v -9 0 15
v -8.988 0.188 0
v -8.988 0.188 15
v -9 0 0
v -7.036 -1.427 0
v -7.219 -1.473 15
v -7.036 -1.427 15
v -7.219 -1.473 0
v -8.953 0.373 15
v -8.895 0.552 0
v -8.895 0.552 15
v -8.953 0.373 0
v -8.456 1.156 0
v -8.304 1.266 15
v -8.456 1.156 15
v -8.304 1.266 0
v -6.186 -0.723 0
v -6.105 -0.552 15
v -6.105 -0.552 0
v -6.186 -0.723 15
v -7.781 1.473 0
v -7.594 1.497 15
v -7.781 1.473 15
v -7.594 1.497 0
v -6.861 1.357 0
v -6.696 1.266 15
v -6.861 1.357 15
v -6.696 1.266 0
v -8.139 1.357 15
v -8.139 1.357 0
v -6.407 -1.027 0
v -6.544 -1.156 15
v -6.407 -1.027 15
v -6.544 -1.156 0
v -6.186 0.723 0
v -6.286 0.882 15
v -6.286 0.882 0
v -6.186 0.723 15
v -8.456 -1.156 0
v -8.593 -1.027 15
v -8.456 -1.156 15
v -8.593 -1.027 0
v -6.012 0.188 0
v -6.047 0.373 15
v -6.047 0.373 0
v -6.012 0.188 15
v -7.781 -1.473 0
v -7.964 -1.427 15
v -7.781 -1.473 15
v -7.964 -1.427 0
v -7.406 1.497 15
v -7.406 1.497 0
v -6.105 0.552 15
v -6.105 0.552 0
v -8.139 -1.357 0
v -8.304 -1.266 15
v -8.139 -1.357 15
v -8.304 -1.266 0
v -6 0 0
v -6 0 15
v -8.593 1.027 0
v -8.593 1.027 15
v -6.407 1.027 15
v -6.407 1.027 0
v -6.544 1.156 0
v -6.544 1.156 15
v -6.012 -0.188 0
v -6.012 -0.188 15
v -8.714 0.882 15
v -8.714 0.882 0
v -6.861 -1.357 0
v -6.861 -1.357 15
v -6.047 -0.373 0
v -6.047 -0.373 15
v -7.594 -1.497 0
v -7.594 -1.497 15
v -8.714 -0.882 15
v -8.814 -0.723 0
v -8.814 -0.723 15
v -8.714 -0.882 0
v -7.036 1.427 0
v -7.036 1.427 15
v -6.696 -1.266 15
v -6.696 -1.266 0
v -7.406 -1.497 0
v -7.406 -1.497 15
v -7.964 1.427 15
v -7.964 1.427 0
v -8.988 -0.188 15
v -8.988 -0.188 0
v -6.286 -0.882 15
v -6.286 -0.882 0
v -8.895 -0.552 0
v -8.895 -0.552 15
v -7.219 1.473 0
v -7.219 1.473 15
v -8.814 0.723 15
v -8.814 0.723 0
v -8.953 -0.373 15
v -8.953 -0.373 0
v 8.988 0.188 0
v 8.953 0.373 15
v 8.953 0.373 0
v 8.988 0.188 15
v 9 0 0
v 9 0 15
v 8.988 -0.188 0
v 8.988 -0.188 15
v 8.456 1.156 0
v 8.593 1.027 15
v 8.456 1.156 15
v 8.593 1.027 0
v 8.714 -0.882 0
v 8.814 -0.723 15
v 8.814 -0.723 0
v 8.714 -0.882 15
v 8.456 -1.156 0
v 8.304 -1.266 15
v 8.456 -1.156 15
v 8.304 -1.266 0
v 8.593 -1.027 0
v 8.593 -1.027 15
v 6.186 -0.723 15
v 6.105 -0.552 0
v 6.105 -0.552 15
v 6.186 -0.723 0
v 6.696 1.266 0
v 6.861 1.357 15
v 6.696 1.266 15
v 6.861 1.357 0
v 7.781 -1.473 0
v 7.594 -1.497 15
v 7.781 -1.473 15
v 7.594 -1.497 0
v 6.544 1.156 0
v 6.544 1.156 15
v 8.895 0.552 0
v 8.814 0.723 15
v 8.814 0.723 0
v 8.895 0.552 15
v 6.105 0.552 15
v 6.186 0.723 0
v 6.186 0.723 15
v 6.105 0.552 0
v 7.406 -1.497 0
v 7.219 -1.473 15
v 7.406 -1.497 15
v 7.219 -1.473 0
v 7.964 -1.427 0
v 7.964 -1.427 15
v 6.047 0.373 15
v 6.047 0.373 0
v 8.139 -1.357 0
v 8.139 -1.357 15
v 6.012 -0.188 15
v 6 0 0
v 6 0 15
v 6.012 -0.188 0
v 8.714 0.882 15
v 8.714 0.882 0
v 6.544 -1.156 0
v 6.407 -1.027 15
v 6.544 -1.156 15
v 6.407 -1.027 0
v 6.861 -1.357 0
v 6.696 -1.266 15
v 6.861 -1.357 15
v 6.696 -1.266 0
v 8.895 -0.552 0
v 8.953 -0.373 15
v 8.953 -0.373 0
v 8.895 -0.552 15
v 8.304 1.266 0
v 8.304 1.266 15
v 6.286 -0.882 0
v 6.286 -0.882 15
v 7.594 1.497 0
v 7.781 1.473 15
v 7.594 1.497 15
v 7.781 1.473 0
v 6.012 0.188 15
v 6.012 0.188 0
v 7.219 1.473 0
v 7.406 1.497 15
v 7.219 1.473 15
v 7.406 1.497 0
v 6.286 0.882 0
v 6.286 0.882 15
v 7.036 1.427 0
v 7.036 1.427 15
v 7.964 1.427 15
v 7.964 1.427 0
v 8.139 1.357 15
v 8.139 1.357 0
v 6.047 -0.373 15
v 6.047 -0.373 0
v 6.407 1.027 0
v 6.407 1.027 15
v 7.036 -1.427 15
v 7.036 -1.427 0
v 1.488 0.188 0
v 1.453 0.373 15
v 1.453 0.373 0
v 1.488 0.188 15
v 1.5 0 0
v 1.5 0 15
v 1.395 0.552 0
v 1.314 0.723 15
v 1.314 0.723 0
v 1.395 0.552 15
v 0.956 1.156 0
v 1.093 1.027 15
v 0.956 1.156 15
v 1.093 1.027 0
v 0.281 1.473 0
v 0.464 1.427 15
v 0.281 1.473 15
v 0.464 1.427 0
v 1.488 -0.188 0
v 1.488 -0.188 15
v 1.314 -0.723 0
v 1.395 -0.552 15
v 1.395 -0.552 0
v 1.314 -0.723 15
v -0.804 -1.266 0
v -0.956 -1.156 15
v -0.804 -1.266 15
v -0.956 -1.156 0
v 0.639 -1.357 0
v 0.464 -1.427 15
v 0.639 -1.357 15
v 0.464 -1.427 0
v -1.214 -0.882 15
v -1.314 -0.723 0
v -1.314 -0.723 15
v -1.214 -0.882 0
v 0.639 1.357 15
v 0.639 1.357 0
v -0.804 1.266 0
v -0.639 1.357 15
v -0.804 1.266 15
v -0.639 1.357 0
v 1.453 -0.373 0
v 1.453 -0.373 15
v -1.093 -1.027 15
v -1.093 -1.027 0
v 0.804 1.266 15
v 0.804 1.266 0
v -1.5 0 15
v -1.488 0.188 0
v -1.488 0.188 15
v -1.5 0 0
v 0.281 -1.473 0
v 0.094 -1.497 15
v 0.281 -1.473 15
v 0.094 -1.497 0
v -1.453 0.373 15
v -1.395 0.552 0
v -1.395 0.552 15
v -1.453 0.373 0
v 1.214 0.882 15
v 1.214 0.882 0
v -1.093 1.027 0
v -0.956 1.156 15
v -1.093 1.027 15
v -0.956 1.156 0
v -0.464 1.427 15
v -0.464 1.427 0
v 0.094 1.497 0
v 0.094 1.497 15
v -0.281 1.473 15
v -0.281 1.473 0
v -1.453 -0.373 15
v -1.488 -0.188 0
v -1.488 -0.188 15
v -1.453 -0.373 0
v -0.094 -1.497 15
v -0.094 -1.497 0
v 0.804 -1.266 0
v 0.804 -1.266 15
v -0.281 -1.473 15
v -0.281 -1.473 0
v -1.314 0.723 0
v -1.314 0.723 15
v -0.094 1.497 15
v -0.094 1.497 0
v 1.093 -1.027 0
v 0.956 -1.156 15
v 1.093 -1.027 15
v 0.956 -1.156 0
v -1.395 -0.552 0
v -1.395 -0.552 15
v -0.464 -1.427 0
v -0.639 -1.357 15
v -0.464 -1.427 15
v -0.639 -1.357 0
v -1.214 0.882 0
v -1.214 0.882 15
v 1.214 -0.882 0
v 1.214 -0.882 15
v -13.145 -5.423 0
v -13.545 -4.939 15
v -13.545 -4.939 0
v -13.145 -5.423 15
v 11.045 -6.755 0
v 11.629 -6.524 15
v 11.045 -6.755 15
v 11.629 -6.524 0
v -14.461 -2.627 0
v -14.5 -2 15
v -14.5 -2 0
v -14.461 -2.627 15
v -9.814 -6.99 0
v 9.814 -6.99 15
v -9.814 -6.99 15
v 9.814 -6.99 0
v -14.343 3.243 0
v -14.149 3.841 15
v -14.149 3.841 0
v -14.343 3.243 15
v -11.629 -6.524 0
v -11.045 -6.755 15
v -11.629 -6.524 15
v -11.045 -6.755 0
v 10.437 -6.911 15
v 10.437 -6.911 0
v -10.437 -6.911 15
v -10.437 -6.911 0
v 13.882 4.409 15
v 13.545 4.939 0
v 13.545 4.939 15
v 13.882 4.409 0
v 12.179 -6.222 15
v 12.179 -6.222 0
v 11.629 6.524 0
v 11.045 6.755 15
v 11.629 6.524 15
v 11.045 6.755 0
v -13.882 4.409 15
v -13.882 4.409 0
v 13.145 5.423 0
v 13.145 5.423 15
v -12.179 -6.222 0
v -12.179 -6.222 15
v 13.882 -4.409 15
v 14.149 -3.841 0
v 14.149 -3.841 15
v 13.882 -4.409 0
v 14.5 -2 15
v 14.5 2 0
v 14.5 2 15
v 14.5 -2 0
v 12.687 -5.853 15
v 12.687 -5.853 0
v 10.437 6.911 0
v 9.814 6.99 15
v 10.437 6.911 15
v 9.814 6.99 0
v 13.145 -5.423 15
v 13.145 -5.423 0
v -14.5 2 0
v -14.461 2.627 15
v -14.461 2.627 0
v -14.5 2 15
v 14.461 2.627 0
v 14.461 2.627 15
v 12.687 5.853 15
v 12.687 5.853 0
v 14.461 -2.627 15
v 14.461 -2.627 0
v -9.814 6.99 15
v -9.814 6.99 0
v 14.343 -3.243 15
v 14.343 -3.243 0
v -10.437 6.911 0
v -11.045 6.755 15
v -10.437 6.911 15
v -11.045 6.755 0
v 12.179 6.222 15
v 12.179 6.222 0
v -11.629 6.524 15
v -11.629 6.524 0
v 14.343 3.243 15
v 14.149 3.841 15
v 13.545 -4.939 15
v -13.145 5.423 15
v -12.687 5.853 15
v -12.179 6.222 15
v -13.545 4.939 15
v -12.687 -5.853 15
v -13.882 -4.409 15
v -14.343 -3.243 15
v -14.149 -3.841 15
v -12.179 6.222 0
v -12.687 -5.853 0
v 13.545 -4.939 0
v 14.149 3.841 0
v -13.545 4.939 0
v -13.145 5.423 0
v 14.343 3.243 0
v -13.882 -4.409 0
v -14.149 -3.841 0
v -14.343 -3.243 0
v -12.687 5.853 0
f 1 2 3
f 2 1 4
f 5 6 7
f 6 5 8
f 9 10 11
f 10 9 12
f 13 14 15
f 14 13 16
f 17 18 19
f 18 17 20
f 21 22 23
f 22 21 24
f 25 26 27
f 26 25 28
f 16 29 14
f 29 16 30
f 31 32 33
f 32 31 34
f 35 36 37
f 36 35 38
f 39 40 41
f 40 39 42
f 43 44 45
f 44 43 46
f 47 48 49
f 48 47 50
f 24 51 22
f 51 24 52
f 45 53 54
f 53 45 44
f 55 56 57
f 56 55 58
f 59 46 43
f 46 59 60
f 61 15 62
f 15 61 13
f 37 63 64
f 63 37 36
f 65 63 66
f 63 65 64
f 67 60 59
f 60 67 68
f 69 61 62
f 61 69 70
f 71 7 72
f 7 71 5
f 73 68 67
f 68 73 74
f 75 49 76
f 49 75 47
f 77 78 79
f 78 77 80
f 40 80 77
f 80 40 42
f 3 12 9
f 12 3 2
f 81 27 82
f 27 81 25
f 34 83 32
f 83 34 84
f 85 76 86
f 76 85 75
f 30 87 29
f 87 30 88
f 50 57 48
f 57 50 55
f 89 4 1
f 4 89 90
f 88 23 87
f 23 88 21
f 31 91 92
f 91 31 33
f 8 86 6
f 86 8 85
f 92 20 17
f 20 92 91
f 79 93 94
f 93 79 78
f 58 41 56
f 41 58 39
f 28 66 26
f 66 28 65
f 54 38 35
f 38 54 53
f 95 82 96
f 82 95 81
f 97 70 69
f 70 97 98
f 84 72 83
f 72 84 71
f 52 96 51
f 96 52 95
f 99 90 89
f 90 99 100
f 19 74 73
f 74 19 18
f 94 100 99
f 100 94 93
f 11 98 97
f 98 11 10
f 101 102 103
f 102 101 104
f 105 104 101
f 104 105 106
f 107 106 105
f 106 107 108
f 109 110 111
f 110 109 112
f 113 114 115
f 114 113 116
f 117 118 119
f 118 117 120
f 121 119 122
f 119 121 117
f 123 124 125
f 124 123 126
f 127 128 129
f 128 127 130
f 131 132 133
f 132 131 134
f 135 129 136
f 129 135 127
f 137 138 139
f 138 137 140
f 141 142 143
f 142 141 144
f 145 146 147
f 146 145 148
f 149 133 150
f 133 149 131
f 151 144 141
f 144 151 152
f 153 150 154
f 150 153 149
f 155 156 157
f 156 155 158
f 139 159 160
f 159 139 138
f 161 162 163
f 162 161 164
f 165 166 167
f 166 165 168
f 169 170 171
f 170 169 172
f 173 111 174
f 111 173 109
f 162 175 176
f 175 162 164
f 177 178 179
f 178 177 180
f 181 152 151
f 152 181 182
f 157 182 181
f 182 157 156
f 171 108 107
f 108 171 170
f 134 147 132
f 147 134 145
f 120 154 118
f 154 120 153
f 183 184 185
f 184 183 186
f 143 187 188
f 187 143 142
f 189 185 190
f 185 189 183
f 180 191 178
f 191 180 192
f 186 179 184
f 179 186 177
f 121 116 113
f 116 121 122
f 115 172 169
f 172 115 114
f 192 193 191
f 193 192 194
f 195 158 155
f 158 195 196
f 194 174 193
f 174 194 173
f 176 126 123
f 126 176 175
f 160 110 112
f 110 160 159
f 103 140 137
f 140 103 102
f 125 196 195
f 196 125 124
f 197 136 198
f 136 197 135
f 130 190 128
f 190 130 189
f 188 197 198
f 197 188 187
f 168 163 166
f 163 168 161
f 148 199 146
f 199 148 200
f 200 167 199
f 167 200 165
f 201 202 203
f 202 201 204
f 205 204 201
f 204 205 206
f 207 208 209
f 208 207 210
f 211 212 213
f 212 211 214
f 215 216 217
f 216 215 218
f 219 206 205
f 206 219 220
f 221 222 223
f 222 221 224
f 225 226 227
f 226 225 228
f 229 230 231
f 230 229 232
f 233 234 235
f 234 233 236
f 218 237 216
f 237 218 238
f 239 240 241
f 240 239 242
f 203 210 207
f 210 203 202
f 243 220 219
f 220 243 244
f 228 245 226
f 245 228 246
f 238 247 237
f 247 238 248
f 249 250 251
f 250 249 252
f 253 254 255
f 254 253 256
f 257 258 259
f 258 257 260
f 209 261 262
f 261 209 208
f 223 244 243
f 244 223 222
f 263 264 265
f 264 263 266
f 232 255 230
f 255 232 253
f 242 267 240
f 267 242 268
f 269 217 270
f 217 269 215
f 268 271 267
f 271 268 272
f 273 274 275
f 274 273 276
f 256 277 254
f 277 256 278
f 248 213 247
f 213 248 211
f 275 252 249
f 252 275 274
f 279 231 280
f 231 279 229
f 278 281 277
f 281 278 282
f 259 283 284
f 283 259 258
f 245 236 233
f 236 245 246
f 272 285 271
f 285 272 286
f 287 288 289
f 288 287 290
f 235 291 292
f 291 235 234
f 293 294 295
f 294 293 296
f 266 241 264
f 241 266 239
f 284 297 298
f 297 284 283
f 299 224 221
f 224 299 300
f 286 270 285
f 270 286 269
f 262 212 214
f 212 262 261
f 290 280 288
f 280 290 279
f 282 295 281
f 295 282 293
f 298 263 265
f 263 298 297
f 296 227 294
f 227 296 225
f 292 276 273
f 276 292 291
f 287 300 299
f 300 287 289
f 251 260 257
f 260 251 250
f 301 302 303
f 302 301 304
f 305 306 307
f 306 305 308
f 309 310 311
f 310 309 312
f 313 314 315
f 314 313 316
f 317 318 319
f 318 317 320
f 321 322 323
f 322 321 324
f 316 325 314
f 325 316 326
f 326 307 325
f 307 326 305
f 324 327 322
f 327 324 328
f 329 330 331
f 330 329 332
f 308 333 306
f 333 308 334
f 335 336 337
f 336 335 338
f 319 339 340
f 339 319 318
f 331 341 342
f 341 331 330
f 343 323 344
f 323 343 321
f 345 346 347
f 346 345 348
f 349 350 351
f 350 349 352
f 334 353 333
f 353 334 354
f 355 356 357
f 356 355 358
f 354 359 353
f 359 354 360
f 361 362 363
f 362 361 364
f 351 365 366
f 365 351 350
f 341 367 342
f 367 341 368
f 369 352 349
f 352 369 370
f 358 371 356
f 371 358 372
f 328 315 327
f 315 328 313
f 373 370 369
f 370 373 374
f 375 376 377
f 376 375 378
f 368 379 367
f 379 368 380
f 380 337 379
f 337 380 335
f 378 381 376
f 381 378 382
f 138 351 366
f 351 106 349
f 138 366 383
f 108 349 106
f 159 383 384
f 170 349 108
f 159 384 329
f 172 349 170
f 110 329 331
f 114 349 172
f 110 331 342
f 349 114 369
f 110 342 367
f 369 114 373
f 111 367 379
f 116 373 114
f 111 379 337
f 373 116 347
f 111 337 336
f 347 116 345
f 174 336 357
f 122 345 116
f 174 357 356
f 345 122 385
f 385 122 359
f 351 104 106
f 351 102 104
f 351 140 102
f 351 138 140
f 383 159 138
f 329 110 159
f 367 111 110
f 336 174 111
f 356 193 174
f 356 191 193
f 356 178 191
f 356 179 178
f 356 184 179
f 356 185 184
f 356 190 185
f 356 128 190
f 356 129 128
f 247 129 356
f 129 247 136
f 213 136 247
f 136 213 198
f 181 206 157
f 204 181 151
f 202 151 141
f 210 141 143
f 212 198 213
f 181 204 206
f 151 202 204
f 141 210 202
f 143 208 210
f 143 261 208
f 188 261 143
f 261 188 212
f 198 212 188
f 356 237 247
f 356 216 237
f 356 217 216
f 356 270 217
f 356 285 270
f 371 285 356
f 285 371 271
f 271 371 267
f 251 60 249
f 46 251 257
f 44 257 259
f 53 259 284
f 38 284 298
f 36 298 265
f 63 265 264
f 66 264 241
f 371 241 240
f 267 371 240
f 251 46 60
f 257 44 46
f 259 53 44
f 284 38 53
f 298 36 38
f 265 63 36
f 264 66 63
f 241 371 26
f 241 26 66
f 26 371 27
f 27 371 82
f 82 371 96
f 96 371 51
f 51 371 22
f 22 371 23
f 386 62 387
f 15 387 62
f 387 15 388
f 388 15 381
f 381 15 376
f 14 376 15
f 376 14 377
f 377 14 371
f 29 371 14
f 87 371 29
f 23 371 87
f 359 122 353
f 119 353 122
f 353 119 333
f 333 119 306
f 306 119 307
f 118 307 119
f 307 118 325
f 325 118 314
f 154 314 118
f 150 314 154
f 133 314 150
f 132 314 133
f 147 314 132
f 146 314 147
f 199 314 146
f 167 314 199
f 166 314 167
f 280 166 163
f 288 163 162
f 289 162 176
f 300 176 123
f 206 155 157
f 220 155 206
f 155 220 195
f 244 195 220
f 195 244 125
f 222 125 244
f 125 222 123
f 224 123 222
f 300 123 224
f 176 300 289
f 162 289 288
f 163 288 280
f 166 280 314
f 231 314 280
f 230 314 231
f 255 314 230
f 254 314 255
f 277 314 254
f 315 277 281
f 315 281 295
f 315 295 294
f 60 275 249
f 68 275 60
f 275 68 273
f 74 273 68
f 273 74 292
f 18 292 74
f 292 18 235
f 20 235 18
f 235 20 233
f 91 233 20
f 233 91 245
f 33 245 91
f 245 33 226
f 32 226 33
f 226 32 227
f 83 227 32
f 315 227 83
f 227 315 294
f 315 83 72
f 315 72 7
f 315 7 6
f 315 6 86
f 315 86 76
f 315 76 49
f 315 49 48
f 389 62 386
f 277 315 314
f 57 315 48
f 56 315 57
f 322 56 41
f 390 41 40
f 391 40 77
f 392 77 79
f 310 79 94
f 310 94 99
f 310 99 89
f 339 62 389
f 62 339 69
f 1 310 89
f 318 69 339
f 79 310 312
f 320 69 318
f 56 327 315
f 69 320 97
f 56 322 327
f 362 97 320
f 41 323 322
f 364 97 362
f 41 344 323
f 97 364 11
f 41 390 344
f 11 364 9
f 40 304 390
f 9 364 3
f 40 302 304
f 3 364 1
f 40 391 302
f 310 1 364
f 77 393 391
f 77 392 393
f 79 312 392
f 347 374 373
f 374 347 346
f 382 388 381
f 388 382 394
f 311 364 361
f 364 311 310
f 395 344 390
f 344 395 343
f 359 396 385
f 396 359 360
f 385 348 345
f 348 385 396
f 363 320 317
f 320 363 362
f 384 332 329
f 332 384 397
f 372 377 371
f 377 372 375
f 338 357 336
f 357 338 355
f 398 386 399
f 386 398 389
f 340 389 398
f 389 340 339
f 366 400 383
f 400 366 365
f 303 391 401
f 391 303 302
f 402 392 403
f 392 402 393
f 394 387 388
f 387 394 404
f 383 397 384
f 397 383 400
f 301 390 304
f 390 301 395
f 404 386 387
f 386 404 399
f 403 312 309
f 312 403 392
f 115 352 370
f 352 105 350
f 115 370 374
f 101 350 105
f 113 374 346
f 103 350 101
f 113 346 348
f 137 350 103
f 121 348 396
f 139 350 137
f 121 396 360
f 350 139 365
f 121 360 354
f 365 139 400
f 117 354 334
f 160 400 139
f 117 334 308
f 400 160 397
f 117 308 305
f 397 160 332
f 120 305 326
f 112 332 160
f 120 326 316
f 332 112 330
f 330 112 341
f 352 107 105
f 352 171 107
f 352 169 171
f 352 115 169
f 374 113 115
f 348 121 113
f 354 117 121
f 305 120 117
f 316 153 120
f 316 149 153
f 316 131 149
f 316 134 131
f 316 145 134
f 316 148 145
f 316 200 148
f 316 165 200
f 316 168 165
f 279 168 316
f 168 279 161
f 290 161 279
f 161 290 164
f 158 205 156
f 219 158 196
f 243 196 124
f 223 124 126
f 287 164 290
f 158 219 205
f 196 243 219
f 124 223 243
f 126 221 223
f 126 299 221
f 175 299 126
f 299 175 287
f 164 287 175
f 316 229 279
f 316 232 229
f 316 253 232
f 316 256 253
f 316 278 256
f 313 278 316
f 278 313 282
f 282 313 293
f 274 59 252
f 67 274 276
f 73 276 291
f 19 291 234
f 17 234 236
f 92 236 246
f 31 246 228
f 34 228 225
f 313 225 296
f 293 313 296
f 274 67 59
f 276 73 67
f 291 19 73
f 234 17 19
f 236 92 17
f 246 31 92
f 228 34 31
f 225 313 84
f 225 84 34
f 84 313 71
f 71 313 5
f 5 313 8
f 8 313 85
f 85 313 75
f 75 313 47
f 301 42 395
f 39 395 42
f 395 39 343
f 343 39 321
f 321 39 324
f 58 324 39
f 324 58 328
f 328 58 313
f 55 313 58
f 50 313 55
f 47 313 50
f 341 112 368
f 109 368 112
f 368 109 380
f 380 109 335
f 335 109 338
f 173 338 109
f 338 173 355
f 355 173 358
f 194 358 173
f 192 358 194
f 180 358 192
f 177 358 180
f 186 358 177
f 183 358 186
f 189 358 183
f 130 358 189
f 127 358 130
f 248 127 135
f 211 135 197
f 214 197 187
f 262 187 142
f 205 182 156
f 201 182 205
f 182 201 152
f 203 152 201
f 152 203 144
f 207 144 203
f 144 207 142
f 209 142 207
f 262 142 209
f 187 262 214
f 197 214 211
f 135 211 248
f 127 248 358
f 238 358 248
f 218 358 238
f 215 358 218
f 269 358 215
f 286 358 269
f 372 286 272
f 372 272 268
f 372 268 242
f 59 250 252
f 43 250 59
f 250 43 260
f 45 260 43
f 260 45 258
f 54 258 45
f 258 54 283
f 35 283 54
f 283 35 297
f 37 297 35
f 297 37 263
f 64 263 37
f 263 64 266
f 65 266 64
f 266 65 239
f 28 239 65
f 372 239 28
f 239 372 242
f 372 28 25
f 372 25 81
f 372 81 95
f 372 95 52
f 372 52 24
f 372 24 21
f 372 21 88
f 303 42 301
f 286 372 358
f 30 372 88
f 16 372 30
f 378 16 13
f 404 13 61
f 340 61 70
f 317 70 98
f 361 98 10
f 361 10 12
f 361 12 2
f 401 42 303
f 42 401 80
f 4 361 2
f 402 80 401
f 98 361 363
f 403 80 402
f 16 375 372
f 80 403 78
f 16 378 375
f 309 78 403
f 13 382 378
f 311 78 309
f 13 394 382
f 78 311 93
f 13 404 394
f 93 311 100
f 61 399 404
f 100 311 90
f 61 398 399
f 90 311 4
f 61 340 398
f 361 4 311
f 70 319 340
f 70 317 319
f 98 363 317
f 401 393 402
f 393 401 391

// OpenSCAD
$fn = 50;


difference() {
	union() {
		hull() {
			translate(v = [-9.5000000000, 2.0000000000, 0]) {
				cylinder(h = 15, r = 5);
			}
			translate(v = [9.5000000000, 2.0000000000, 0]) {
				cylinder(h = 15, r = 5);
			}
			translate(v = [-9.5000000000, -2.0000000000, 0]) {
				cylinder(h = 15, r = 5);
			}
			translate(v = [9.5000000000, -2.0000000000, 0]) {
				cylinder(h = 15, r = 5);
			}
		}
	}
	union() {
		translate(v = [-7.5000000000, 0.0000000000, 0]) {
			translate(v = [0, 0, -100]) {
				cylinder(h = 200, r = 1.5000000000);
			}
		}
		translate(v = [7.5000000000, 0.0000000000, 0]) {
			translate(v = [0, 0, -100]) {
				cylinder(h = 200, r = 1.5000000000);
			}
		}
		translate(v = [-7.5000000000, 0.0000000000, 0]) {
			translate(v = [0, 0, -100]) {
				cylinder(h = 200, r = 1.5000000000);
			}
		}
		translate(v = [0, 0, -100]) {
			cylinder(h = 200, r = 1.5000000000);
		}
		translate(v = [7.5000000000, 0.0000000000, 0]) {
			translate(v = [0, 0, -100]) {
				cylinder(h = 200, r = 1.5000000000);
			}
		}
	}
}
